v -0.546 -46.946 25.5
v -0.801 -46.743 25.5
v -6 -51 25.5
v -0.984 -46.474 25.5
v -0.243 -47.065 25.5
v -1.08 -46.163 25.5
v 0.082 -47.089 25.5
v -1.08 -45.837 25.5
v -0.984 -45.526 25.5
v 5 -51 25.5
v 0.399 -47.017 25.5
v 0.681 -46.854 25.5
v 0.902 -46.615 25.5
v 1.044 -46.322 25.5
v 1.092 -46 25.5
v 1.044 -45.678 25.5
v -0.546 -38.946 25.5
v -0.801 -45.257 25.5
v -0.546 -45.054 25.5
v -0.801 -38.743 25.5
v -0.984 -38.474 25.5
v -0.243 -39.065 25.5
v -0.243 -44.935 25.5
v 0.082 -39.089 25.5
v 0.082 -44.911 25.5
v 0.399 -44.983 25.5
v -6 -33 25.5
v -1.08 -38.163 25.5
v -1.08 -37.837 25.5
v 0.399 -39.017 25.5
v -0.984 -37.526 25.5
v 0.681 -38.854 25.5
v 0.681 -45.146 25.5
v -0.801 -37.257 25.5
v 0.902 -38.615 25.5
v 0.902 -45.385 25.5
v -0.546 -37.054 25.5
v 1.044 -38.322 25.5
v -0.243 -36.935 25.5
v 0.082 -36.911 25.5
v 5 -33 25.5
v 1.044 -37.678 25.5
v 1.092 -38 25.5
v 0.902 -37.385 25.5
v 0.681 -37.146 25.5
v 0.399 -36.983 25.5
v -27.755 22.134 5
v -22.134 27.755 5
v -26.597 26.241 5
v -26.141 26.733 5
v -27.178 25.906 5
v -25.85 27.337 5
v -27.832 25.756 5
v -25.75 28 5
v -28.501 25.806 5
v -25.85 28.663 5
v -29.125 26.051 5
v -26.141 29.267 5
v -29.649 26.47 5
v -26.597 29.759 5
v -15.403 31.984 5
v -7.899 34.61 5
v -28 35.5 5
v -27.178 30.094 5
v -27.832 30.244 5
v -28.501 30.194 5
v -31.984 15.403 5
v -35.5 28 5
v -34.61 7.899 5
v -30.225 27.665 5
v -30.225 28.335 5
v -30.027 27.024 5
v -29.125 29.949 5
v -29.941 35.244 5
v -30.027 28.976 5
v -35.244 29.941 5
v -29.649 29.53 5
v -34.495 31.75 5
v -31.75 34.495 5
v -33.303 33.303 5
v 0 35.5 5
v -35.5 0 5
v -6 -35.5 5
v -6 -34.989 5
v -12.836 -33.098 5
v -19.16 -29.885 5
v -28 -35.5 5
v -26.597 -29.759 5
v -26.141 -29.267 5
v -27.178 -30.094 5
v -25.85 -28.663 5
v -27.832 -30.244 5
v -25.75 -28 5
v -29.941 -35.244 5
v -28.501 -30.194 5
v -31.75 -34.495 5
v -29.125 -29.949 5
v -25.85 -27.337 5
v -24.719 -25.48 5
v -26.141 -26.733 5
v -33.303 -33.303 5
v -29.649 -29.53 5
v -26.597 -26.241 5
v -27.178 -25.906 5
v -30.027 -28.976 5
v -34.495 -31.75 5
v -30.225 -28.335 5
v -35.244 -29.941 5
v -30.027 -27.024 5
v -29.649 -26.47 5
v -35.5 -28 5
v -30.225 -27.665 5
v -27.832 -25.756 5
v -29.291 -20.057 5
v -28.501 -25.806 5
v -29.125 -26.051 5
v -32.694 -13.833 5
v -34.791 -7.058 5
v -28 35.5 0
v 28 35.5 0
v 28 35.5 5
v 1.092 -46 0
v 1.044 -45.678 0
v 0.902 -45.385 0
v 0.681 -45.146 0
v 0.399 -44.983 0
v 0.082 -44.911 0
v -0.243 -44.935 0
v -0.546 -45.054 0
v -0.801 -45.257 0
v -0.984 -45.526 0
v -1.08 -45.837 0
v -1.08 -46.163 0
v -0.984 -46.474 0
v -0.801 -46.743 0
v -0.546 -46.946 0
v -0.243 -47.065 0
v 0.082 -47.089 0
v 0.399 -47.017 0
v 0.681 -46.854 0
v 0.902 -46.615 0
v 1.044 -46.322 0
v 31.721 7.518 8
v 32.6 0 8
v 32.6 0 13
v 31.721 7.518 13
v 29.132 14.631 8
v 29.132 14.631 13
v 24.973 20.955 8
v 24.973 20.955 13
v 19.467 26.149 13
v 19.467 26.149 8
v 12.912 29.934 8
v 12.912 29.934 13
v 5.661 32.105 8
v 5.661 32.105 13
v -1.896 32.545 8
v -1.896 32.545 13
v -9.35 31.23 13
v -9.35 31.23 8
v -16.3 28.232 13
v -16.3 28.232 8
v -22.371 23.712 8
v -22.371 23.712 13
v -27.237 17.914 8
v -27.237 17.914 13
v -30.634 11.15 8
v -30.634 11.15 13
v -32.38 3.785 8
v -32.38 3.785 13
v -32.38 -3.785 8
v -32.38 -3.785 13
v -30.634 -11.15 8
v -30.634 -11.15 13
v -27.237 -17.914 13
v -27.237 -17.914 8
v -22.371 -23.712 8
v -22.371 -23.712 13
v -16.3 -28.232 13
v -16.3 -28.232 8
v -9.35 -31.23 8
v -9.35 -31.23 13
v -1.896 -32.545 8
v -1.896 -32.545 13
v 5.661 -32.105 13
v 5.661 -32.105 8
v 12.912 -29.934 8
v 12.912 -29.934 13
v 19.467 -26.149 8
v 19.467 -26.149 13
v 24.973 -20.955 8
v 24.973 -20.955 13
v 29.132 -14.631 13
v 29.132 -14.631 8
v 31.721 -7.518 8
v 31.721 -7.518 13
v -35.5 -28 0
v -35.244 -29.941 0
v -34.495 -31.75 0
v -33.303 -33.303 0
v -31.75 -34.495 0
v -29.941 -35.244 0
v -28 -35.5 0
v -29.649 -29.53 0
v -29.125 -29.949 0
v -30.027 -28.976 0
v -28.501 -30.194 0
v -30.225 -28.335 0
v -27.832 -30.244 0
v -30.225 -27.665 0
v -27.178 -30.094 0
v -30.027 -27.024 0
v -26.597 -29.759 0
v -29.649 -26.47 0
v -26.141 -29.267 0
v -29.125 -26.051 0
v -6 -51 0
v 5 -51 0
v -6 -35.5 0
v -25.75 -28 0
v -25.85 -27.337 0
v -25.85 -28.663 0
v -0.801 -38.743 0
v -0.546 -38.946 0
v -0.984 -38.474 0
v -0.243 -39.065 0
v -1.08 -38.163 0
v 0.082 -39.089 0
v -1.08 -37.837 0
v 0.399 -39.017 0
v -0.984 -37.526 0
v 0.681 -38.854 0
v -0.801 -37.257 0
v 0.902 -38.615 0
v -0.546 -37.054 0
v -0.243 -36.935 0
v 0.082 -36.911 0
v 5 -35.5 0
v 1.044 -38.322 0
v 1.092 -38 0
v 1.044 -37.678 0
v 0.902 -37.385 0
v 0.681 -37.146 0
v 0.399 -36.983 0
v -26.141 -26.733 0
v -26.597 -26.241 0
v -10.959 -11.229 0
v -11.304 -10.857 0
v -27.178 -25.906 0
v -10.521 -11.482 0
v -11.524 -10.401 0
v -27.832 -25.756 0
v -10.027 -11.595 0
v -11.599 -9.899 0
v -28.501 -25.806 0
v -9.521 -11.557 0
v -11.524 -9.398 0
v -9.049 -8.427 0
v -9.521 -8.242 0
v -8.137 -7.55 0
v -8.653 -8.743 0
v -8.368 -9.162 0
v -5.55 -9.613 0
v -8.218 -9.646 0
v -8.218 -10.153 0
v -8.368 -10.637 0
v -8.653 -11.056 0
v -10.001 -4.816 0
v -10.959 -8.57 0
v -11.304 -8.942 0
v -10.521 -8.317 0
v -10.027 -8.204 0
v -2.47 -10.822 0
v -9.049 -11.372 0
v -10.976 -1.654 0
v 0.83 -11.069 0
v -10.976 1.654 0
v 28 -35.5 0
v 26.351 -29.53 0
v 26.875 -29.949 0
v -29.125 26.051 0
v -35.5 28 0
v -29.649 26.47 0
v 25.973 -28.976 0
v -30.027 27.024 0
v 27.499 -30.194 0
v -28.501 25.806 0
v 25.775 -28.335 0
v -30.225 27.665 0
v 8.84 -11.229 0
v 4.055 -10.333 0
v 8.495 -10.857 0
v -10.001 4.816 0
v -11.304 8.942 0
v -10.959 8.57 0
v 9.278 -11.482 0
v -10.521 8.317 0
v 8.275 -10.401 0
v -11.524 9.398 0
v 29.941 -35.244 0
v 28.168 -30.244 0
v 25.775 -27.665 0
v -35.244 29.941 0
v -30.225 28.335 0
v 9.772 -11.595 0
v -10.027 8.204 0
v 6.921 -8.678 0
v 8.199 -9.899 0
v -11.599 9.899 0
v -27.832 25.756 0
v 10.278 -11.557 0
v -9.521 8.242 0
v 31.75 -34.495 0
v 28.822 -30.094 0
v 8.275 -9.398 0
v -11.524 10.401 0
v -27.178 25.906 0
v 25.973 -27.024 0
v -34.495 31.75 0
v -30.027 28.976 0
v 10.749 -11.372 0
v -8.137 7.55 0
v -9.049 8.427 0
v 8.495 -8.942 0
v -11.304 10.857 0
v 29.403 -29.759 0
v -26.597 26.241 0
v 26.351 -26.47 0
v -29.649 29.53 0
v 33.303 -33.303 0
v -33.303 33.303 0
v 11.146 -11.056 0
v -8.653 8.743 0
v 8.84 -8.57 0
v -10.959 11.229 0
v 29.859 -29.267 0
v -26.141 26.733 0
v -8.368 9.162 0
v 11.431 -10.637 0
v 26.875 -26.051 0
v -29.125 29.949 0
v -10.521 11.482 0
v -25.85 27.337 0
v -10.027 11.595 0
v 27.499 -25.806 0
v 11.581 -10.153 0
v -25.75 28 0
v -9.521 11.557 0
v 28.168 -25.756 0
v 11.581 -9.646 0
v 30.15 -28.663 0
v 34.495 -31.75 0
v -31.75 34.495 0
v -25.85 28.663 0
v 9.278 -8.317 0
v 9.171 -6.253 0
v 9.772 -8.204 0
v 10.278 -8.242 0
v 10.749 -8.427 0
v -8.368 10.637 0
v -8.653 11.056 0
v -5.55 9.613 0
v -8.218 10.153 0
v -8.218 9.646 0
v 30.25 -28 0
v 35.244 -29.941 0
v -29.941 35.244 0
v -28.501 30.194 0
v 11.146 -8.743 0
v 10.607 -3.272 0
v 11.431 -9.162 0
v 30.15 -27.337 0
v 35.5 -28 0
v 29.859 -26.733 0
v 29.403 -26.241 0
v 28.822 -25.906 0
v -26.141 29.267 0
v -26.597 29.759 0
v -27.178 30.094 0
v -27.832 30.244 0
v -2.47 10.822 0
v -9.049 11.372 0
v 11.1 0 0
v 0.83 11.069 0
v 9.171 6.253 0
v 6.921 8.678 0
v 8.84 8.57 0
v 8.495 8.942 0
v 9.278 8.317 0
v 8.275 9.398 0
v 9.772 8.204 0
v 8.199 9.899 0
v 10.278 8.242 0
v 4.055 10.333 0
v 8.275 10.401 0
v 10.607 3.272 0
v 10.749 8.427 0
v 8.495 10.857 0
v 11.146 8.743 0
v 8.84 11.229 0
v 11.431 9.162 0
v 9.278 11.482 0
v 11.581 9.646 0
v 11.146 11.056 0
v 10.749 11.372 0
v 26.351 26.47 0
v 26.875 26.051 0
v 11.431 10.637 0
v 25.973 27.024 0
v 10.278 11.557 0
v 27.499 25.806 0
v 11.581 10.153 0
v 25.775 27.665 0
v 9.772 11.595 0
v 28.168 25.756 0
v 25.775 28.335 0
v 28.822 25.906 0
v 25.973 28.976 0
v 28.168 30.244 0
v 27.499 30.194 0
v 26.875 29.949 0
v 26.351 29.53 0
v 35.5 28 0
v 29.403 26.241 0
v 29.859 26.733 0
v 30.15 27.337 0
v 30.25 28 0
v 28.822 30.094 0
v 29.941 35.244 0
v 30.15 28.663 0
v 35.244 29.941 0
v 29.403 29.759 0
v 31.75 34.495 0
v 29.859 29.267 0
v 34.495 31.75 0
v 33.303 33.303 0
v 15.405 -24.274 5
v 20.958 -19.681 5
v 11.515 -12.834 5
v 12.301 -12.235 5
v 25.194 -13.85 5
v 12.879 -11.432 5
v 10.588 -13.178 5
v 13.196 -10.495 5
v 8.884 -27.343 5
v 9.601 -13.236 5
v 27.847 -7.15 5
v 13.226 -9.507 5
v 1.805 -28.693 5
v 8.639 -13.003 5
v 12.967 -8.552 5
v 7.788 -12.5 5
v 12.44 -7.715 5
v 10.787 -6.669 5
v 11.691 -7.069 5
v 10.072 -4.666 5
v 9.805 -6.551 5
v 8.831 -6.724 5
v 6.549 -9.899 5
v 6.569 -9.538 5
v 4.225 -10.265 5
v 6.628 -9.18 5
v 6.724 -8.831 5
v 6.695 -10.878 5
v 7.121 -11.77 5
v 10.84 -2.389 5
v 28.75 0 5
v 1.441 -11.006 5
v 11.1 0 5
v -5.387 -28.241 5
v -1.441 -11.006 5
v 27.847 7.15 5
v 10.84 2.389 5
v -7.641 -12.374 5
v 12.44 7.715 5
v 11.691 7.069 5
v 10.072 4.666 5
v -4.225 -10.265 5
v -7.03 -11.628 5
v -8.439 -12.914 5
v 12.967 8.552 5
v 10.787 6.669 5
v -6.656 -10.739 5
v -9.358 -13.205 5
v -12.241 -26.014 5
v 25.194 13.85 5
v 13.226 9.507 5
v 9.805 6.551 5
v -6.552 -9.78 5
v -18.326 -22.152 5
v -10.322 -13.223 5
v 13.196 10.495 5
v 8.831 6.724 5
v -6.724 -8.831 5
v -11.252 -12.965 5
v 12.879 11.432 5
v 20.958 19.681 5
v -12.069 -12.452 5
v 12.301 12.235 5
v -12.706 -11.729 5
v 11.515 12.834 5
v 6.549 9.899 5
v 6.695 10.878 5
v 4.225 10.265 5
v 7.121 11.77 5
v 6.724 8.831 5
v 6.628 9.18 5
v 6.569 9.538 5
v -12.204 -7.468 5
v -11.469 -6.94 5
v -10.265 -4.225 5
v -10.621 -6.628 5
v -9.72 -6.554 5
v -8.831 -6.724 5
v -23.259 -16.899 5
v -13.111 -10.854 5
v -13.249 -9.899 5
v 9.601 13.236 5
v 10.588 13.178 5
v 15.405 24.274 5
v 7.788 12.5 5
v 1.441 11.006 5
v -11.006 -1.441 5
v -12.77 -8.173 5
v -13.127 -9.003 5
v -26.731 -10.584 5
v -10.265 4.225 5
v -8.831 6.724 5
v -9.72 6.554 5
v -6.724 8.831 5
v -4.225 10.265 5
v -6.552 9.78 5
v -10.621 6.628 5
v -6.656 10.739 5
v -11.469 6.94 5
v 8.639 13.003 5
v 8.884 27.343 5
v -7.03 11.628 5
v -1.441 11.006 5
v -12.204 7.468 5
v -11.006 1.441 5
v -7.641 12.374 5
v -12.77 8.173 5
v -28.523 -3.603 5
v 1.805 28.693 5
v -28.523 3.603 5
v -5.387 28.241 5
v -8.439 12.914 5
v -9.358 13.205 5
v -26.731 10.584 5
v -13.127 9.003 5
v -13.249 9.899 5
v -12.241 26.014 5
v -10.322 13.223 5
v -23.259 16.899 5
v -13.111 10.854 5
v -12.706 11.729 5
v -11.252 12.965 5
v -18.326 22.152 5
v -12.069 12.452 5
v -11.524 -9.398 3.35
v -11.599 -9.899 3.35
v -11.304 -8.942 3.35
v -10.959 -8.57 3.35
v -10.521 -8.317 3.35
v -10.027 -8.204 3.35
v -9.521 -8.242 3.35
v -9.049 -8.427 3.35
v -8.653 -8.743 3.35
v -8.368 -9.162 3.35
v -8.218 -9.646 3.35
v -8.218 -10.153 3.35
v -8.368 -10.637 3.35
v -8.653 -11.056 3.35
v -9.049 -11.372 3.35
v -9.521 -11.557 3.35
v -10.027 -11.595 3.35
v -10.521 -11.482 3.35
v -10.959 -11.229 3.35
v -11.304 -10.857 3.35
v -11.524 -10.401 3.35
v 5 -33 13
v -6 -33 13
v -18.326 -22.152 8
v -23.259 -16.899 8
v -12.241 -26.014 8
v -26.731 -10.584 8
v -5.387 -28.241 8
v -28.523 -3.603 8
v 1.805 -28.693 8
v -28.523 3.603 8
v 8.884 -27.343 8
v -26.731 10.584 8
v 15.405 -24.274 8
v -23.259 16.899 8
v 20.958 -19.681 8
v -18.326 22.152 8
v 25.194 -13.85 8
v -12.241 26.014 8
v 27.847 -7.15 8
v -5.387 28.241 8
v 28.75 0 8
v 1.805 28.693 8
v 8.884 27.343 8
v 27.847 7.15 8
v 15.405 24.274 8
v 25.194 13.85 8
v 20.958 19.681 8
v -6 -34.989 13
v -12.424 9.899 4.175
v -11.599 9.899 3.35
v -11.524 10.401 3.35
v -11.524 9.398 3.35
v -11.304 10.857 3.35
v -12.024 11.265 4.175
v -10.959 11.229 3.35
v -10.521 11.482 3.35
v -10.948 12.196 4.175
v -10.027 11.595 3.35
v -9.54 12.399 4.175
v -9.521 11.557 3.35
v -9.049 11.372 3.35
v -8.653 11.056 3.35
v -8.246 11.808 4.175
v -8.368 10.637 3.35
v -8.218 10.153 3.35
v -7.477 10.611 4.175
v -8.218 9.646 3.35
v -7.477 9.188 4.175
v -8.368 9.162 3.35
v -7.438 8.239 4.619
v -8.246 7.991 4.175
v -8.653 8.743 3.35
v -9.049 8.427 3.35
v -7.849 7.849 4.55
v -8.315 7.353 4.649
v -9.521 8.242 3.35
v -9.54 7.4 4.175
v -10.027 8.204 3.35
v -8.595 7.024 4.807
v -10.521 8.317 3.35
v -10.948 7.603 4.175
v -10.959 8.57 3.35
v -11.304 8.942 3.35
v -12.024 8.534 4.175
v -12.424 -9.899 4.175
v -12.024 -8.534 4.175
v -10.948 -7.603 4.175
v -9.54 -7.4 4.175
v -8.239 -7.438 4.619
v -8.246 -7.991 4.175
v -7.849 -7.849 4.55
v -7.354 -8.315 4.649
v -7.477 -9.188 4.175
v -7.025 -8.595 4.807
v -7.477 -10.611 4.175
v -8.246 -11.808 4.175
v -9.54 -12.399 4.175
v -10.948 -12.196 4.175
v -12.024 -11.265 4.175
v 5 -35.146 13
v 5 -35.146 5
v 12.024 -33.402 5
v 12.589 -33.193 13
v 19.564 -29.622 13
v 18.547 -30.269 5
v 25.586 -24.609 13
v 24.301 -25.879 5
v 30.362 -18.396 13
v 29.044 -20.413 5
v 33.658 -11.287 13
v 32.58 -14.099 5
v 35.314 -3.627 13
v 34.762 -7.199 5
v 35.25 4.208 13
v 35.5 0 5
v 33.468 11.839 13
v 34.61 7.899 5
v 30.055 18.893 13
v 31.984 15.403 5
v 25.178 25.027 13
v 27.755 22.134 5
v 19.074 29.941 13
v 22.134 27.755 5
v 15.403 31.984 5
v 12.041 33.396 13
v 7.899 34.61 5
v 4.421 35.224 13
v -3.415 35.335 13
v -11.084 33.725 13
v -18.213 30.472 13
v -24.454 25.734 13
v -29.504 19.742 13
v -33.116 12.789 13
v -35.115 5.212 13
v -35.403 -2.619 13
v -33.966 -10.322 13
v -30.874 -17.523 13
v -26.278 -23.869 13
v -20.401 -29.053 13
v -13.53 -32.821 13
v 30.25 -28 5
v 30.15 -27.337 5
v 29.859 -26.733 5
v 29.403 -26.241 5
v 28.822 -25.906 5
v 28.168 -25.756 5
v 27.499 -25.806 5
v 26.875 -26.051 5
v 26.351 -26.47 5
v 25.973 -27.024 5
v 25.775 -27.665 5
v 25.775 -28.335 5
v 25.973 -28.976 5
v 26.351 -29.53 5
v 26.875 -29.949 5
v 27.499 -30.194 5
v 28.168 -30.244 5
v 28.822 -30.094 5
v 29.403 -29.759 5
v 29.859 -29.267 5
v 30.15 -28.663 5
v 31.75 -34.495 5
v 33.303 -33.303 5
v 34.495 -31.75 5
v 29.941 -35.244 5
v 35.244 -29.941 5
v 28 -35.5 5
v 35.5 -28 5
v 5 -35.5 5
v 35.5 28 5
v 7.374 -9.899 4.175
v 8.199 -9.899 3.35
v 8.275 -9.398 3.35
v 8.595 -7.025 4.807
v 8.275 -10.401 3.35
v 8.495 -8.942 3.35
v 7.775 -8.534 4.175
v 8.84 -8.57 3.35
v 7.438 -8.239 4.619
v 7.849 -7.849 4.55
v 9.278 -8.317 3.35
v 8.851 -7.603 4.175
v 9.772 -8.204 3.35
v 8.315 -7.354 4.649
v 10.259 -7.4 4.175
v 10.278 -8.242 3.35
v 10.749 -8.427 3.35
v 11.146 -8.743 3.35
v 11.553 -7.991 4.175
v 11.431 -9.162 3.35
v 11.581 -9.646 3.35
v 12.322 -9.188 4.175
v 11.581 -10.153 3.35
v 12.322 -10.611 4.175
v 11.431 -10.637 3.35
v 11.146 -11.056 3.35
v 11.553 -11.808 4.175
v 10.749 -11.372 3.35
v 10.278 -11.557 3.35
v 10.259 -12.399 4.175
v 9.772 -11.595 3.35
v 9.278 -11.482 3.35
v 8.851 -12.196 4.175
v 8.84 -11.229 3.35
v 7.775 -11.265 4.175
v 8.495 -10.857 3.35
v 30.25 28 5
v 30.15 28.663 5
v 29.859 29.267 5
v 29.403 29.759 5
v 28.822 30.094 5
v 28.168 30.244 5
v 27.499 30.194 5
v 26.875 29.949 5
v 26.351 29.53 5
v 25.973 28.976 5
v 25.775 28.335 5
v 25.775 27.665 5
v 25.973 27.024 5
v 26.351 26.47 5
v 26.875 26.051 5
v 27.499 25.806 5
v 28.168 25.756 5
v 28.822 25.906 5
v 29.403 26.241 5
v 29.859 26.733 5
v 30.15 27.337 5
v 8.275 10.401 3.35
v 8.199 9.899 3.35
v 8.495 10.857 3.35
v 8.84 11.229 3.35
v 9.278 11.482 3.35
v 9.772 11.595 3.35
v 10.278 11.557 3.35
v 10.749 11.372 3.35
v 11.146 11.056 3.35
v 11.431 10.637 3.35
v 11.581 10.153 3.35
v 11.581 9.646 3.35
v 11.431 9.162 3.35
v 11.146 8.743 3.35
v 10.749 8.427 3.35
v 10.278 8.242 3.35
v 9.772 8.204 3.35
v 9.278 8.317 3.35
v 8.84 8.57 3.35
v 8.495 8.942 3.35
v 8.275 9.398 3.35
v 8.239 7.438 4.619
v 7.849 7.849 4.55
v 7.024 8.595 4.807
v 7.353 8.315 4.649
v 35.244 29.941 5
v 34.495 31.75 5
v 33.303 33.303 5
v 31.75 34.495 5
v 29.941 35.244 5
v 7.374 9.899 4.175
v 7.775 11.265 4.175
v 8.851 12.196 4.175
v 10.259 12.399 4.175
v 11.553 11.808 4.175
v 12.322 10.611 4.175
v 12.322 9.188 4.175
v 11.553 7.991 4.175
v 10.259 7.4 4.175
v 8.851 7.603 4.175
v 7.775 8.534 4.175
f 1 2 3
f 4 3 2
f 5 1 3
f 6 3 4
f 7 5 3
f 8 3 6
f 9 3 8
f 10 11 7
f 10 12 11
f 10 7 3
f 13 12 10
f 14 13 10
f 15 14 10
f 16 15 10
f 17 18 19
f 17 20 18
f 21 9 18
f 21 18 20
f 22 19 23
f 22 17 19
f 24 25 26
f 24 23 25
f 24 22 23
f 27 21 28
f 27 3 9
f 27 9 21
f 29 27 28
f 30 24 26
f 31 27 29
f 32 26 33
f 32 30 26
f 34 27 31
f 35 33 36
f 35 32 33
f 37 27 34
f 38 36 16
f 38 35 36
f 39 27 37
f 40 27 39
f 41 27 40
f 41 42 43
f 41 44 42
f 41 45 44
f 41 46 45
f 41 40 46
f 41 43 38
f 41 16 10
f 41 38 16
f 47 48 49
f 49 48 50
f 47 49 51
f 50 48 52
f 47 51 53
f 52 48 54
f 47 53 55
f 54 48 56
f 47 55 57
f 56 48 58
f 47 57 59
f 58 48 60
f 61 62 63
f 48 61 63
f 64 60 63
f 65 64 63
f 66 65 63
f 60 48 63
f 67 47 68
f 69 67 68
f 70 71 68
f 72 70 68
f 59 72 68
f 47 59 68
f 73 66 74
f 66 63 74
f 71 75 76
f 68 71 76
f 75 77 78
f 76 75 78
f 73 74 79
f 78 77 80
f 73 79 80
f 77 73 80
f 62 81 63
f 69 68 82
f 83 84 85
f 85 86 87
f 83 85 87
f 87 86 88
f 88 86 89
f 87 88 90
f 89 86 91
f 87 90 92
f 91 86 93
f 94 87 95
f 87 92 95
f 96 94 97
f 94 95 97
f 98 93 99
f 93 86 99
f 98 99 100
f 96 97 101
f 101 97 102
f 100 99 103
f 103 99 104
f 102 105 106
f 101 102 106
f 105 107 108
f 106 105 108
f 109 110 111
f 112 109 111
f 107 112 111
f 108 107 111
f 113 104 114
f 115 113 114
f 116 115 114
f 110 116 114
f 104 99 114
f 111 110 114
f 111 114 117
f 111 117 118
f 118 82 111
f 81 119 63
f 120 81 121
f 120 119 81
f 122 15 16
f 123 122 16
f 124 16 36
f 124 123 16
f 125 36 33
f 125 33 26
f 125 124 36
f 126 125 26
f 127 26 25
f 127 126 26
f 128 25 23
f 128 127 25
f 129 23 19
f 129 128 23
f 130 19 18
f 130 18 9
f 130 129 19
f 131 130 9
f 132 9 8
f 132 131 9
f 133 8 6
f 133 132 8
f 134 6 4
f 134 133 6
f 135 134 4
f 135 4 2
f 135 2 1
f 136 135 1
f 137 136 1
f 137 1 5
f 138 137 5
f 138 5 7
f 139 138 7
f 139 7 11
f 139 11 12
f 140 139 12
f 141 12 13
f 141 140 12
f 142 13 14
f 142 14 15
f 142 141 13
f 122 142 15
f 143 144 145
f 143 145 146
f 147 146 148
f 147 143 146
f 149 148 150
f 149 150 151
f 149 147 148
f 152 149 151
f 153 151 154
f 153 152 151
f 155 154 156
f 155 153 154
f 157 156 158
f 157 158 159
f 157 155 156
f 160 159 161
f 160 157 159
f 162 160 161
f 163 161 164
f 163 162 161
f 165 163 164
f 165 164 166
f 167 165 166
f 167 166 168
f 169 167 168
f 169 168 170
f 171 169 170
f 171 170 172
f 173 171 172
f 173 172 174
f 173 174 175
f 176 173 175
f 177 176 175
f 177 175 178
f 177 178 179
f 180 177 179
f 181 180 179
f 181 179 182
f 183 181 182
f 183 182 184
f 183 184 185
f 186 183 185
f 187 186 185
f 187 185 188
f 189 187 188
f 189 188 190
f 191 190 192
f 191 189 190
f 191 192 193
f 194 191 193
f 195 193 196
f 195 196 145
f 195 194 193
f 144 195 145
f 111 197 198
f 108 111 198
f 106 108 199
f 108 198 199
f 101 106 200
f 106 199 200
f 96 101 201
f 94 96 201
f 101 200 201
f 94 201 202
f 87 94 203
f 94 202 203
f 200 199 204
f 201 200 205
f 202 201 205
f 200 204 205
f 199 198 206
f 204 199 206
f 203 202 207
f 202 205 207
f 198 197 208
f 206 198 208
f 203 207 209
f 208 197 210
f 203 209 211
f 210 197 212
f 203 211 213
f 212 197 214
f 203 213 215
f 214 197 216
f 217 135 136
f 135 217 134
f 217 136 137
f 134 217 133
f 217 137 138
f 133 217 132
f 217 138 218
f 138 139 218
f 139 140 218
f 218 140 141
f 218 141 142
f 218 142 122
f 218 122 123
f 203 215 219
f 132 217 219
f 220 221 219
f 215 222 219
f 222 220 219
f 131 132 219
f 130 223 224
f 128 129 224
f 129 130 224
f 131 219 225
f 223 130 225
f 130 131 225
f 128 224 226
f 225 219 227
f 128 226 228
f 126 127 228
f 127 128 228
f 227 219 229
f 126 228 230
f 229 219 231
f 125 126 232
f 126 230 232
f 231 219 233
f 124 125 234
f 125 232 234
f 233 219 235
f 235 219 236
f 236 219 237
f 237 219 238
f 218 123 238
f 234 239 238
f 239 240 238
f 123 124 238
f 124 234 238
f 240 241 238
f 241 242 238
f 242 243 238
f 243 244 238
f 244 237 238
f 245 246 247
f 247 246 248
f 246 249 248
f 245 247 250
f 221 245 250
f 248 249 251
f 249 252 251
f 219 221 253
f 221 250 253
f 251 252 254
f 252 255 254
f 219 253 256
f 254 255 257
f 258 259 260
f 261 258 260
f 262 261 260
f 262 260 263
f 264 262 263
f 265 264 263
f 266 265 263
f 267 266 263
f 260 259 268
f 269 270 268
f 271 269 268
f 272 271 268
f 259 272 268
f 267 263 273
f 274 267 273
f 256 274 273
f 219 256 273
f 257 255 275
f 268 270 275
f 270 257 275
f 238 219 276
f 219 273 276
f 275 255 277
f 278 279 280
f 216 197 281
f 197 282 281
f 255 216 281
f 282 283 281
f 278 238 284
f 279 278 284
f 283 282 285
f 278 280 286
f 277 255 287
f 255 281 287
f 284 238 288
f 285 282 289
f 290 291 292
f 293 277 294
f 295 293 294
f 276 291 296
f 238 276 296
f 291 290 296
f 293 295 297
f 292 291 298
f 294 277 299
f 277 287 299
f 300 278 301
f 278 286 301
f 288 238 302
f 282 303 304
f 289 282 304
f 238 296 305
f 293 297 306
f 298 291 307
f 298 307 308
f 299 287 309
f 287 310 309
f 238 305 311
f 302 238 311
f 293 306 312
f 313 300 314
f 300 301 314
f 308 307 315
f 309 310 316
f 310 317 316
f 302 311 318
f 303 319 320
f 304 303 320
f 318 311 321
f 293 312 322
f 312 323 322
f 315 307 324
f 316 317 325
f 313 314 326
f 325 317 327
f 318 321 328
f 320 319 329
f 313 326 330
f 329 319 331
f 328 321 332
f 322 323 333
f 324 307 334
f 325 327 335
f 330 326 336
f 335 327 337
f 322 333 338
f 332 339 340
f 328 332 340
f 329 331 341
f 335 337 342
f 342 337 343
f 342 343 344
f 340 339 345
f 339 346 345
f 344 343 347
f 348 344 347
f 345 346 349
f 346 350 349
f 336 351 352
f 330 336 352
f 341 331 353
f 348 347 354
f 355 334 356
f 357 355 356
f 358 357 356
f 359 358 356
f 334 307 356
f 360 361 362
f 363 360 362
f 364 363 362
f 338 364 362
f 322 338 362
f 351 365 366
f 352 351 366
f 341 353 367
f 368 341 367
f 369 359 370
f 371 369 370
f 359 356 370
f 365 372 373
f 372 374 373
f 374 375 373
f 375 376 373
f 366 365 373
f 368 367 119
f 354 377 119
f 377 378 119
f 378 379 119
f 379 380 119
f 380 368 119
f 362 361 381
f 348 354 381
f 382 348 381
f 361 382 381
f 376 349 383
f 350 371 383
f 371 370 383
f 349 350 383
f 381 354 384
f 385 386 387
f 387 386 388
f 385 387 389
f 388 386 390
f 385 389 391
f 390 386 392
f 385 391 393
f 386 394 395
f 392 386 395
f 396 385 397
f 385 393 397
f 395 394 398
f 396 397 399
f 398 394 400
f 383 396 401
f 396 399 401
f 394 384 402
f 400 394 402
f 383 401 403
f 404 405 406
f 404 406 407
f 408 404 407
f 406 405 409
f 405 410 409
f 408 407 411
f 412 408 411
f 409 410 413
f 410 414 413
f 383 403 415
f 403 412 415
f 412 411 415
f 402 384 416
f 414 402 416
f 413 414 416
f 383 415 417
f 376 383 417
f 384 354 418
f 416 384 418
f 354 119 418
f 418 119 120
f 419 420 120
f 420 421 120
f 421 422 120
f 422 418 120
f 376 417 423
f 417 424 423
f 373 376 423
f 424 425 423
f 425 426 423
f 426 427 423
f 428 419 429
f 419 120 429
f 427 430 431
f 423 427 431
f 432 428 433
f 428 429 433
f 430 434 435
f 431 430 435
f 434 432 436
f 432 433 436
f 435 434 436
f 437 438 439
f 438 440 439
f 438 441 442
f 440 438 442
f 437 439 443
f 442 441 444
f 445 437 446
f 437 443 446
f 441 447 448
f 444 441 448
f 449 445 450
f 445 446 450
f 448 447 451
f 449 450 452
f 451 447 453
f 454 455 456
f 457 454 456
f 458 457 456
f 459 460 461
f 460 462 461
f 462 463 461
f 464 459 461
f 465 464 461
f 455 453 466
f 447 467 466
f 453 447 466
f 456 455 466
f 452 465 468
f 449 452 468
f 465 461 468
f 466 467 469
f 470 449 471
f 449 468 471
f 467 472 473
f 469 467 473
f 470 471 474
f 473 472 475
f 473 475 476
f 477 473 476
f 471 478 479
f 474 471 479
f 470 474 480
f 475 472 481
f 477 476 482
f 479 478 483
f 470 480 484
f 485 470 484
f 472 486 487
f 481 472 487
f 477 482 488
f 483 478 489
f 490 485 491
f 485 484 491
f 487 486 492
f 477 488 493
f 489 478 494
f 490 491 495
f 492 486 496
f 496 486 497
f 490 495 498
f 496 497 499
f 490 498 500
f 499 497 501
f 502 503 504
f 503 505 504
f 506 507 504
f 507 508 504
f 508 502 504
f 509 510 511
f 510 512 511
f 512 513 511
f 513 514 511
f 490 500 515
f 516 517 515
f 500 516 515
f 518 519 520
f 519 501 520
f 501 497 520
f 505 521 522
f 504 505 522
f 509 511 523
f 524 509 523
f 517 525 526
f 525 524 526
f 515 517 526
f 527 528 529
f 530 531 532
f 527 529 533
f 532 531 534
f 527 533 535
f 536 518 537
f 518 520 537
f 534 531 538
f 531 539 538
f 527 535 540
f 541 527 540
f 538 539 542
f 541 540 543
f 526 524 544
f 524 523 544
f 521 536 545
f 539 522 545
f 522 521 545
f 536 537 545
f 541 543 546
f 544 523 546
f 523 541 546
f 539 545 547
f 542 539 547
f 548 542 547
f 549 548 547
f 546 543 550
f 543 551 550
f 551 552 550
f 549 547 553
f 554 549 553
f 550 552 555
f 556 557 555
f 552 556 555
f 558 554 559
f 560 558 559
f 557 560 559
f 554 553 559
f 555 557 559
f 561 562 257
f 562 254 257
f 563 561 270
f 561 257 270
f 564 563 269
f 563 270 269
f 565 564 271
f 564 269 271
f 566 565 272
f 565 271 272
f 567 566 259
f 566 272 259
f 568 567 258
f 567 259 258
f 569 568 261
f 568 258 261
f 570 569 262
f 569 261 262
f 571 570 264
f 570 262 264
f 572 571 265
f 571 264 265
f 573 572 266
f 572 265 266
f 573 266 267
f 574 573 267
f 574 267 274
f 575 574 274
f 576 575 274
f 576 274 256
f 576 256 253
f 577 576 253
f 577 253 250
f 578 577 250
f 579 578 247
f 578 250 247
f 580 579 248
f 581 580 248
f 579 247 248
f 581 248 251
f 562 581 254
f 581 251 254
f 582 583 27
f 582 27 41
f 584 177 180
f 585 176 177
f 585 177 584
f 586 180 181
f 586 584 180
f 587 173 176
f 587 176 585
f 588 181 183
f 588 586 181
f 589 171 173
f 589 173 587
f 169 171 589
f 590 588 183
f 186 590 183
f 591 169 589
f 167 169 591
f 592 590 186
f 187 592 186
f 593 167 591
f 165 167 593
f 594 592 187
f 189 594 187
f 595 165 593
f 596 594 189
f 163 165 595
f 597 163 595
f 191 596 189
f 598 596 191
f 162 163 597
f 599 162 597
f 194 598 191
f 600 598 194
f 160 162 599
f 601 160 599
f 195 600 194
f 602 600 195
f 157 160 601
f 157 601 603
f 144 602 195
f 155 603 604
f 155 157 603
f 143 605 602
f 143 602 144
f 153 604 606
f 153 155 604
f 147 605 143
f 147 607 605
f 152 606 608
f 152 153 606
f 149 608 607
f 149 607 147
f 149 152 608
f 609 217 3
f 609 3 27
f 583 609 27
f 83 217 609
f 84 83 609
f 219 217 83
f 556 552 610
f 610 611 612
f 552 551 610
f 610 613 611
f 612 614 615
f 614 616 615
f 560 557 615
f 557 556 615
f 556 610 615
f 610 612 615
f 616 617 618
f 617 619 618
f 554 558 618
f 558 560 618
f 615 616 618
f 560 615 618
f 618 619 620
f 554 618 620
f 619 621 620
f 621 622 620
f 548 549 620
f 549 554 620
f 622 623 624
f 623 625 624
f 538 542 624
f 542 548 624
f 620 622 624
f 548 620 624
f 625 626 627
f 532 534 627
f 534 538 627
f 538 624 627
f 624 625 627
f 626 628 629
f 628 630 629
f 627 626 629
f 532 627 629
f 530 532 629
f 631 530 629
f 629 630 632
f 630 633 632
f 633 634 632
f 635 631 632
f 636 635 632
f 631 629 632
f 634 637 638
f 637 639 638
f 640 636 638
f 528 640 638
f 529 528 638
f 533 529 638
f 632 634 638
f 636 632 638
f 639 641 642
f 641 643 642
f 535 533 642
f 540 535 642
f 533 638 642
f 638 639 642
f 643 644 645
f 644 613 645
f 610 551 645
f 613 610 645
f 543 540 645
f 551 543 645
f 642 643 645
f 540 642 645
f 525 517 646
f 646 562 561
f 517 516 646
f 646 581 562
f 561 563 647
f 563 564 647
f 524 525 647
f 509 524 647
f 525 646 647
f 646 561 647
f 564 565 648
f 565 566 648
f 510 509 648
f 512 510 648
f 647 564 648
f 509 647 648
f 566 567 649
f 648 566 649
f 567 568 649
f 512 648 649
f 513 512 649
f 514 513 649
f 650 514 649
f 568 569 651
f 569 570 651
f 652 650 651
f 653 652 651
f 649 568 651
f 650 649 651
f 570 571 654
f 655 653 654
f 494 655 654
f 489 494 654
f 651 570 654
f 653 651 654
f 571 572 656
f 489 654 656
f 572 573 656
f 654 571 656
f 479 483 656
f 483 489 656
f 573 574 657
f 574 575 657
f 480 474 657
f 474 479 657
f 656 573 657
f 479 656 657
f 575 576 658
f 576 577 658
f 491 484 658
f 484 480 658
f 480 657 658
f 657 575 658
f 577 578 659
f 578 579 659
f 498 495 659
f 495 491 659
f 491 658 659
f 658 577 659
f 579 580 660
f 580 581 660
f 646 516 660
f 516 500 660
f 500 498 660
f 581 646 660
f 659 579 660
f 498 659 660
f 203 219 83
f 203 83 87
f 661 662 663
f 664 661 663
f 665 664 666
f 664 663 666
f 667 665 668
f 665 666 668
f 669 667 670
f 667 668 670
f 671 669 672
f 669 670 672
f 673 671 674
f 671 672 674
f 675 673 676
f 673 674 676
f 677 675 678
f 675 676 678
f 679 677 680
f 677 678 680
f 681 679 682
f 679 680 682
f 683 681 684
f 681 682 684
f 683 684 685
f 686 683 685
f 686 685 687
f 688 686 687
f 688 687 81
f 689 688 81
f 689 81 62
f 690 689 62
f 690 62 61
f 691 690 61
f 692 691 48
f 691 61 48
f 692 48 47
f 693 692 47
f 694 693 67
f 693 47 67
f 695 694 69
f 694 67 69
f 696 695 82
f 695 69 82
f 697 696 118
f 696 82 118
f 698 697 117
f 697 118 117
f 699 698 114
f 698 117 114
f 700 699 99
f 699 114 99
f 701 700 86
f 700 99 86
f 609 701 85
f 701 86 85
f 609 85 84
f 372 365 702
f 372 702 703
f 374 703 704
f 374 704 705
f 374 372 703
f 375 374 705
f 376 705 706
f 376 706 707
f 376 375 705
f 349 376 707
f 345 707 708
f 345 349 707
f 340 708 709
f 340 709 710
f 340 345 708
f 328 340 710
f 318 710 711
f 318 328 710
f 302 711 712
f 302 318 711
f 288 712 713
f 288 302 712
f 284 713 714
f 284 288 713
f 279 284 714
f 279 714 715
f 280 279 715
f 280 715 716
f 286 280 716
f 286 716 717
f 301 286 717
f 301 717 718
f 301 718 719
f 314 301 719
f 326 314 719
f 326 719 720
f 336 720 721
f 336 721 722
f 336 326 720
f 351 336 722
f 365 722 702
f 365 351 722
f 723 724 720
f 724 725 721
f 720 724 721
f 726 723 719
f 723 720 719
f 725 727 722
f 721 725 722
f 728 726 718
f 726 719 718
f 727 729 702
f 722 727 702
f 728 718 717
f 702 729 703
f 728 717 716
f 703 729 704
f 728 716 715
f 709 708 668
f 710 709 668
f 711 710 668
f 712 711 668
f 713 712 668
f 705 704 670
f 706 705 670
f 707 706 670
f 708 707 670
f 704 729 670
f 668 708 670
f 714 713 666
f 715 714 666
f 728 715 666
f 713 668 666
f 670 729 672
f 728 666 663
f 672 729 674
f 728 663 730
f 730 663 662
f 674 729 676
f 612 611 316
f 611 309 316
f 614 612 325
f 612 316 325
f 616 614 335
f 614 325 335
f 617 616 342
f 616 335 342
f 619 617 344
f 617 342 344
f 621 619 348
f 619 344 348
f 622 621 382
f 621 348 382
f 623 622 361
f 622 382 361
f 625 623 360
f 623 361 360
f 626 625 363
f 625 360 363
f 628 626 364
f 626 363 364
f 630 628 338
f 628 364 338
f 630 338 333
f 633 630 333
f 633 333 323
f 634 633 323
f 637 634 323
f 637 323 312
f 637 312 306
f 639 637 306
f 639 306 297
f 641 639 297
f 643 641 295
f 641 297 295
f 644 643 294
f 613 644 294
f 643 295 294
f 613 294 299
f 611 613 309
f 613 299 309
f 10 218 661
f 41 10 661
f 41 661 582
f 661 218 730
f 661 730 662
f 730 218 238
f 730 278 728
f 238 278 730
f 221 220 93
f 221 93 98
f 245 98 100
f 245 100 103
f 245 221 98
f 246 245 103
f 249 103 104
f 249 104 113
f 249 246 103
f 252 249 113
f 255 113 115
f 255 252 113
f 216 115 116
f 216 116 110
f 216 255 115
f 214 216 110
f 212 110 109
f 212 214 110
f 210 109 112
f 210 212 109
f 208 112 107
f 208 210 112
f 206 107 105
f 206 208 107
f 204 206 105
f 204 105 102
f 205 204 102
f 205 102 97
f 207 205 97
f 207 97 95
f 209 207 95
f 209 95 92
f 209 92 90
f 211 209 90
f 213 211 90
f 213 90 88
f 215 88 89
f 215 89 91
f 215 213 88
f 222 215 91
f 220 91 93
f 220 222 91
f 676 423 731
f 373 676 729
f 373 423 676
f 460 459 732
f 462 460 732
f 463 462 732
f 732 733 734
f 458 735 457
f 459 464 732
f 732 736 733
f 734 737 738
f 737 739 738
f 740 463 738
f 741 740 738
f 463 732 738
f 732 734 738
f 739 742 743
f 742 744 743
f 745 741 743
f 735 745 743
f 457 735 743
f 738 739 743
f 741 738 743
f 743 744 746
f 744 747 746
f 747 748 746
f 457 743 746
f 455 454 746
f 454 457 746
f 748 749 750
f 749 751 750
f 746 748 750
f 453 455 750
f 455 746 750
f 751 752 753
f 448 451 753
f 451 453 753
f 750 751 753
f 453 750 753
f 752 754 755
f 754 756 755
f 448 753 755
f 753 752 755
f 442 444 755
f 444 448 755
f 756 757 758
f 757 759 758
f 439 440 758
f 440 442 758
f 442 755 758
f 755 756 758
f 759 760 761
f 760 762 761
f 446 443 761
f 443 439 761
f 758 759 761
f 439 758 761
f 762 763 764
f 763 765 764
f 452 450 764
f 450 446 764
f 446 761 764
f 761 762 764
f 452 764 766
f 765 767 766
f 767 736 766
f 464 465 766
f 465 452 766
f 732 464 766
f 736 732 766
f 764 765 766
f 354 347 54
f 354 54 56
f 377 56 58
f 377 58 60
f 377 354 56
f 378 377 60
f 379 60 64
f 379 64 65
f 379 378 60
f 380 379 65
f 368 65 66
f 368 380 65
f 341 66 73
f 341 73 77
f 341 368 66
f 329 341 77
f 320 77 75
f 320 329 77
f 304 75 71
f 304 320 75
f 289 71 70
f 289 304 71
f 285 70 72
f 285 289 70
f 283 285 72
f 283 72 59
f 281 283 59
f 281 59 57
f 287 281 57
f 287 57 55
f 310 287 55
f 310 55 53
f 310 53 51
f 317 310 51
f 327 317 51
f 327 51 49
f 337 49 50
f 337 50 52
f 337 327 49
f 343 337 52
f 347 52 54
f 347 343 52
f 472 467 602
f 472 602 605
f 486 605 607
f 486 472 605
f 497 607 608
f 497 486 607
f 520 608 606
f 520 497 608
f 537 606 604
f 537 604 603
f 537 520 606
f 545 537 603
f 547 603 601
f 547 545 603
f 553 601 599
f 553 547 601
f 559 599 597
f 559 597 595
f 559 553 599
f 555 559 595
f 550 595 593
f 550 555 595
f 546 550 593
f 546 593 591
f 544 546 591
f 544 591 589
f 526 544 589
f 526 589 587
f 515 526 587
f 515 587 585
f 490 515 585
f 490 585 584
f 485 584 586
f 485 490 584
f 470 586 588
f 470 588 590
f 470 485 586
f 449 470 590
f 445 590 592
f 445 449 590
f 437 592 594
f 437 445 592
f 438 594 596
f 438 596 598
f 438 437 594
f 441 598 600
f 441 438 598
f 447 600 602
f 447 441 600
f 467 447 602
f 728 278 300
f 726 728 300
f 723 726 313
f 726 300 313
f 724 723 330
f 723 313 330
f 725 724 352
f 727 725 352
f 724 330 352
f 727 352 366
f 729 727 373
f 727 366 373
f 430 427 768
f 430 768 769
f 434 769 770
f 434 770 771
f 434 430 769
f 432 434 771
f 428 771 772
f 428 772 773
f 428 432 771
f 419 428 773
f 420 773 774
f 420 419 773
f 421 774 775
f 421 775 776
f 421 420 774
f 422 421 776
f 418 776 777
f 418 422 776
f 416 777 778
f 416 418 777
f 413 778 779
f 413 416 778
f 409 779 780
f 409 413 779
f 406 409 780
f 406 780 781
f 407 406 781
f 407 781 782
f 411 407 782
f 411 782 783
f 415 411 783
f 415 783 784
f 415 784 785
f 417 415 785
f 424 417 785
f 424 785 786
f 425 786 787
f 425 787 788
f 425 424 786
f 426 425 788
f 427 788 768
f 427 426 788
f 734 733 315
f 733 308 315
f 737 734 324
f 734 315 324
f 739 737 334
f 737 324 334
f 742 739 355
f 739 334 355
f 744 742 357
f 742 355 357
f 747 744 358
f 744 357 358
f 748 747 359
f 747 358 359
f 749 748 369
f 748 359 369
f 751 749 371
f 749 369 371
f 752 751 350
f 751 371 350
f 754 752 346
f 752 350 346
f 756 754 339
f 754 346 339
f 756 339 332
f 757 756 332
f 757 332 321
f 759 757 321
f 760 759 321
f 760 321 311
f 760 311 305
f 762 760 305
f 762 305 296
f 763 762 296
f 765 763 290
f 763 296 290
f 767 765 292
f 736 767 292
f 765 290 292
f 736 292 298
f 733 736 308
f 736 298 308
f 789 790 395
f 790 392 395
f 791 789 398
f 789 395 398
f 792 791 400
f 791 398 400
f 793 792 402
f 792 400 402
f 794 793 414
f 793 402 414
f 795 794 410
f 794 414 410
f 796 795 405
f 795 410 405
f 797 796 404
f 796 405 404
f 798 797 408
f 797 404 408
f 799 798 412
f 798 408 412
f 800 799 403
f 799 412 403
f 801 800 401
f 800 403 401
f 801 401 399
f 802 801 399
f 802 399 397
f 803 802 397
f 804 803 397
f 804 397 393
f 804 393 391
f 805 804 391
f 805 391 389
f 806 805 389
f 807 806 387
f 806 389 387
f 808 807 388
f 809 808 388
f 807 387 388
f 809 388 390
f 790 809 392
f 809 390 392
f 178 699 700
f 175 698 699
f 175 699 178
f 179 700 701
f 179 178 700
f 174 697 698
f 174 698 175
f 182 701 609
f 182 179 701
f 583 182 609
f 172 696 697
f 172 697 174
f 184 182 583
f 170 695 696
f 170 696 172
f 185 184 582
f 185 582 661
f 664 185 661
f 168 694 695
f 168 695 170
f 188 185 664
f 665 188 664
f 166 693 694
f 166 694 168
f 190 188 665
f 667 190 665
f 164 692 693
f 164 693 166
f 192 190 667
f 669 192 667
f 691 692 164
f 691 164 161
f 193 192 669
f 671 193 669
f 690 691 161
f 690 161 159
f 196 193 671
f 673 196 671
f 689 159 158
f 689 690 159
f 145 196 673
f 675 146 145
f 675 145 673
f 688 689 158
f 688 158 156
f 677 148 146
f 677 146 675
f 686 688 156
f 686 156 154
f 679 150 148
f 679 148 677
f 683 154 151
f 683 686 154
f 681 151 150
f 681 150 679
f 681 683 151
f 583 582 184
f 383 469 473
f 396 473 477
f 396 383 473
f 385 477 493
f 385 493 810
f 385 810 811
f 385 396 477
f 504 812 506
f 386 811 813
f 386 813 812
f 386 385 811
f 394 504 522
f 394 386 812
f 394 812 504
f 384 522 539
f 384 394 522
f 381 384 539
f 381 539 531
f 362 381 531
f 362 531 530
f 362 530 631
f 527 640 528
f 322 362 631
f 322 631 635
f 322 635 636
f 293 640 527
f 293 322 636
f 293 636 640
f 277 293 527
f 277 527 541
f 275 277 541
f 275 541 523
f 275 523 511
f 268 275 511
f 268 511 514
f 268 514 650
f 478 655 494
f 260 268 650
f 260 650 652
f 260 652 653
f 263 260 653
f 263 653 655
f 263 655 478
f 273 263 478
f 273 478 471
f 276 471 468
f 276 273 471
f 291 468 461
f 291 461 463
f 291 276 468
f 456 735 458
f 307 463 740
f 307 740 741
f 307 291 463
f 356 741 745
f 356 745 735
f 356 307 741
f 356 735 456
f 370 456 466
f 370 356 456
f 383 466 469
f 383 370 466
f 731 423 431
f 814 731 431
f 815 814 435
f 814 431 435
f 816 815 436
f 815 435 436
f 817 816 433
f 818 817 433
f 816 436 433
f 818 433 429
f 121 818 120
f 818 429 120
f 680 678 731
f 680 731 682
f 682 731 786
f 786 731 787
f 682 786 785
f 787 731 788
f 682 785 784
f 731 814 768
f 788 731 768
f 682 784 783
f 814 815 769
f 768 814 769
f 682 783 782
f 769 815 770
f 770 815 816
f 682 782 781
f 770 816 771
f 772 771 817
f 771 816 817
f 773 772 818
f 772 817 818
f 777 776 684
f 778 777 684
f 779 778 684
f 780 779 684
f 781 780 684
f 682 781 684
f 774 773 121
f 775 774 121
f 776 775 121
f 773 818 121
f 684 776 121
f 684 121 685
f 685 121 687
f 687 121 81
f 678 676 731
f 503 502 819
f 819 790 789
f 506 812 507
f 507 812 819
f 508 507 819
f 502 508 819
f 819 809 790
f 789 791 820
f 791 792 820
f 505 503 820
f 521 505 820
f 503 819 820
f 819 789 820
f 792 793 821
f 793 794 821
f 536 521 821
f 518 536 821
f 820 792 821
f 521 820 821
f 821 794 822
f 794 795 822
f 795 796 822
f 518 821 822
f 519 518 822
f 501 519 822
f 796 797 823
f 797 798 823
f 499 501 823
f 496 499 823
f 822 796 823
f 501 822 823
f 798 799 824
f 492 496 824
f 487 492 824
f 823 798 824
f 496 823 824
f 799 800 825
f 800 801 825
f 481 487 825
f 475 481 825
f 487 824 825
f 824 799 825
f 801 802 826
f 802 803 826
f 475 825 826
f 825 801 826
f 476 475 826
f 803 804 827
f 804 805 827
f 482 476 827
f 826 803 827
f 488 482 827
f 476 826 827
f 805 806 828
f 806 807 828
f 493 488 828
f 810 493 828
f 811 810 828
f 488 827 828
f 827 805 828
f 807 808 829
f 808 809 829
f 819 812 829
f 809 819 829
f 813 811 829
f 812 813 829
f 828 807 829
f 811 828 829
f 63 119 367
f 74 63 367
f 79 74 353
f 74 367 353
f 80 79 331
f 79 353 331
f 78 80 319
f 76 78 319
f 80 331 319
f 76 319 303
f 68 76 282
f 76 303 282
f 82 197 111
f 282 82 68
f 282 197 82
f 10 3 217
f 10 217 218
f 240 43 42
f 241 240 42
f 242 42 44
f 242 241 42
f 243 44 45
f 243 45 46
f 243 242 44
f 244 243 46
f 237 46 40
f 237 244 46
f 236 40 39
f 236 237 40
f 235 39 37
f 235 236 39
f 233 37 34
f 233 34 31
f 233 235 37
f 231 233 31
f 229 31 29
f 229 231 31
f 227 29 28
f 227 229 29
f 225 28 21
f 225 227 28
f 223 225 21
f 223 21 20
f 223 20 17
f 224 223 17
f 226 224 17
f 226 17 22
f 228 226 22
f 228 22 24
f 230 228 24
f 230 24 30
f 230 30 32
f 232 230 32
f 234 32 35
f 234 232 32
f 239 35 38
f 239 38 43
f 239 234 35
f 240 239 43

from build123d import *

# Parameters (mm, degrees)
SKETCH004_R         = 2.25
SKETCH004_R_2       = 11.1
SKETCH004_R_3       = 1.65
PAD005_DEPTH        = 5
SKETCH005_R         = 35.5
SKETCH005_R_2       = 32.6
PAD006_DEPTH        = 8
SKETCH070_R         = 32.6
SKETCH070_R_2       = 28.75
PAD045_DEPTH        = 3
SKETCH071_W         = 11
SKETCH071_H         = 18
SKETCH071_R         = 1.0922
PAD046_DEPTH        = 25.5
HOLE002_D           = 3.4
HOLE002_CSINK_D     = 6.7
HOLE002_CSINK_ANGLE = 90


with BuildPart() as part:
    # Sketch004 → Pad005 (new body)
    with BuildSketch(Plane.XY):
        with BuildLine():
            Line((-28, 35.5), (28, 35.5))
            ThreePointArc((35.5, 28), (33.303301, 33.303301), (28, 35.5))
            Line((35.5, 28), (35.5, -28))
            ThreePointArc((28, -35.5), (33.303301, -33.303301), (35.5, -28))
            Line((28, -35.5), (-28, -35.5))
            ThreePointArc((-35.5, -28), (-33.303301, -33.303301), (-28, -35.5))
            Line((-35.5, -28), (-35.5, 28))
            ThreePointArc((-28, 35.5), (-33.303301, 33.303301), (-35.5, 28))
        make_face()
        with Locations((-28, 28)):
            Circle(SKETCH004_R, mode=Mode.SUBTRACT)
        with Locations((28, 28)):
            Circle(SKETCH004_R, mode=Mode.SUBTRACT)
        with Locations((28, -28)):
            Circle(SKETCH004_R, mode=Mode.SUBTRACT)
        with Locations((-28, -28)):
            Circle(SKETCH004_R, mode=Mode.SUBTRACT)
        Circle(SKETCH004_R_2, mode=Mode.SUBTRACT)
        with Locations((-9.899495, 9.899495)):
            Circle(SKETCH004_R_3, mode=Mode.SUBTRACT)
        with Locations((9.899495, 9.899495)):
            Circle(SKETCH004_R_3, mode=Mode.SUBTRACT)
        with Locations((9.899495, -9.899495)):
            Circle(SKETCH004_R_3, mode=Mode.SUBTRACT)
        with Locations((-9.899495, -9.899495)):
            Circle(SKETCH004_R_3, mode=Mode.SUBTRACT)
    extrude(amount=PAD005_DEPTH)

    # Sketch005 → Pad006 (join)
    with BuildSketch(Plane.XY.offset(5)):
        Circle(SKETCH005_R)
        Circle(SKETCH005_R_2, mode=Mode.SUBTRACT)
    extrude(amount=PAD006_DEPTH)

    # Sketch070 → Pad045 (join)
    with BuildSketch(Plane.XY.offset(5)):
        Circle(SKETCH070_R)
        Circle(SKETCH070_R_2, mode=Mode.SUBTRACT)
    extrude(amount=PAD045_DEPTH)

    # Sketch071 → Pad046 (join)
    with BuildSketch(Plane.XY):
        with Locations((-0.5, -42)):
            Rectangle(SKETCH071_W, SKETCH071_H)
        with Locations((0, -38)):
            Circle(SKETCH071_R, mode=Mode.SUBTRACT)
        with Locations((0, -46)):
            Circle(SKETCH071_R, mode=Mode.SUBTRACT)
    extrude(amount=PAD046_DEPTH)

    # Hole002 (through all)
    with Locations(Plane.XY.offset(5)):
        with Locations((-9.899495, 9.899495), (9.899495, 9.899495), (9.899495, -9.899495), (-9.899495, -9.899495)):
            CounterSinkHole(HOLE002_D / 2, HOLE002_CSINK_D / 2, counter_sink_angle=HOLE002_CSINK_ANGLE)


solid = part.part
